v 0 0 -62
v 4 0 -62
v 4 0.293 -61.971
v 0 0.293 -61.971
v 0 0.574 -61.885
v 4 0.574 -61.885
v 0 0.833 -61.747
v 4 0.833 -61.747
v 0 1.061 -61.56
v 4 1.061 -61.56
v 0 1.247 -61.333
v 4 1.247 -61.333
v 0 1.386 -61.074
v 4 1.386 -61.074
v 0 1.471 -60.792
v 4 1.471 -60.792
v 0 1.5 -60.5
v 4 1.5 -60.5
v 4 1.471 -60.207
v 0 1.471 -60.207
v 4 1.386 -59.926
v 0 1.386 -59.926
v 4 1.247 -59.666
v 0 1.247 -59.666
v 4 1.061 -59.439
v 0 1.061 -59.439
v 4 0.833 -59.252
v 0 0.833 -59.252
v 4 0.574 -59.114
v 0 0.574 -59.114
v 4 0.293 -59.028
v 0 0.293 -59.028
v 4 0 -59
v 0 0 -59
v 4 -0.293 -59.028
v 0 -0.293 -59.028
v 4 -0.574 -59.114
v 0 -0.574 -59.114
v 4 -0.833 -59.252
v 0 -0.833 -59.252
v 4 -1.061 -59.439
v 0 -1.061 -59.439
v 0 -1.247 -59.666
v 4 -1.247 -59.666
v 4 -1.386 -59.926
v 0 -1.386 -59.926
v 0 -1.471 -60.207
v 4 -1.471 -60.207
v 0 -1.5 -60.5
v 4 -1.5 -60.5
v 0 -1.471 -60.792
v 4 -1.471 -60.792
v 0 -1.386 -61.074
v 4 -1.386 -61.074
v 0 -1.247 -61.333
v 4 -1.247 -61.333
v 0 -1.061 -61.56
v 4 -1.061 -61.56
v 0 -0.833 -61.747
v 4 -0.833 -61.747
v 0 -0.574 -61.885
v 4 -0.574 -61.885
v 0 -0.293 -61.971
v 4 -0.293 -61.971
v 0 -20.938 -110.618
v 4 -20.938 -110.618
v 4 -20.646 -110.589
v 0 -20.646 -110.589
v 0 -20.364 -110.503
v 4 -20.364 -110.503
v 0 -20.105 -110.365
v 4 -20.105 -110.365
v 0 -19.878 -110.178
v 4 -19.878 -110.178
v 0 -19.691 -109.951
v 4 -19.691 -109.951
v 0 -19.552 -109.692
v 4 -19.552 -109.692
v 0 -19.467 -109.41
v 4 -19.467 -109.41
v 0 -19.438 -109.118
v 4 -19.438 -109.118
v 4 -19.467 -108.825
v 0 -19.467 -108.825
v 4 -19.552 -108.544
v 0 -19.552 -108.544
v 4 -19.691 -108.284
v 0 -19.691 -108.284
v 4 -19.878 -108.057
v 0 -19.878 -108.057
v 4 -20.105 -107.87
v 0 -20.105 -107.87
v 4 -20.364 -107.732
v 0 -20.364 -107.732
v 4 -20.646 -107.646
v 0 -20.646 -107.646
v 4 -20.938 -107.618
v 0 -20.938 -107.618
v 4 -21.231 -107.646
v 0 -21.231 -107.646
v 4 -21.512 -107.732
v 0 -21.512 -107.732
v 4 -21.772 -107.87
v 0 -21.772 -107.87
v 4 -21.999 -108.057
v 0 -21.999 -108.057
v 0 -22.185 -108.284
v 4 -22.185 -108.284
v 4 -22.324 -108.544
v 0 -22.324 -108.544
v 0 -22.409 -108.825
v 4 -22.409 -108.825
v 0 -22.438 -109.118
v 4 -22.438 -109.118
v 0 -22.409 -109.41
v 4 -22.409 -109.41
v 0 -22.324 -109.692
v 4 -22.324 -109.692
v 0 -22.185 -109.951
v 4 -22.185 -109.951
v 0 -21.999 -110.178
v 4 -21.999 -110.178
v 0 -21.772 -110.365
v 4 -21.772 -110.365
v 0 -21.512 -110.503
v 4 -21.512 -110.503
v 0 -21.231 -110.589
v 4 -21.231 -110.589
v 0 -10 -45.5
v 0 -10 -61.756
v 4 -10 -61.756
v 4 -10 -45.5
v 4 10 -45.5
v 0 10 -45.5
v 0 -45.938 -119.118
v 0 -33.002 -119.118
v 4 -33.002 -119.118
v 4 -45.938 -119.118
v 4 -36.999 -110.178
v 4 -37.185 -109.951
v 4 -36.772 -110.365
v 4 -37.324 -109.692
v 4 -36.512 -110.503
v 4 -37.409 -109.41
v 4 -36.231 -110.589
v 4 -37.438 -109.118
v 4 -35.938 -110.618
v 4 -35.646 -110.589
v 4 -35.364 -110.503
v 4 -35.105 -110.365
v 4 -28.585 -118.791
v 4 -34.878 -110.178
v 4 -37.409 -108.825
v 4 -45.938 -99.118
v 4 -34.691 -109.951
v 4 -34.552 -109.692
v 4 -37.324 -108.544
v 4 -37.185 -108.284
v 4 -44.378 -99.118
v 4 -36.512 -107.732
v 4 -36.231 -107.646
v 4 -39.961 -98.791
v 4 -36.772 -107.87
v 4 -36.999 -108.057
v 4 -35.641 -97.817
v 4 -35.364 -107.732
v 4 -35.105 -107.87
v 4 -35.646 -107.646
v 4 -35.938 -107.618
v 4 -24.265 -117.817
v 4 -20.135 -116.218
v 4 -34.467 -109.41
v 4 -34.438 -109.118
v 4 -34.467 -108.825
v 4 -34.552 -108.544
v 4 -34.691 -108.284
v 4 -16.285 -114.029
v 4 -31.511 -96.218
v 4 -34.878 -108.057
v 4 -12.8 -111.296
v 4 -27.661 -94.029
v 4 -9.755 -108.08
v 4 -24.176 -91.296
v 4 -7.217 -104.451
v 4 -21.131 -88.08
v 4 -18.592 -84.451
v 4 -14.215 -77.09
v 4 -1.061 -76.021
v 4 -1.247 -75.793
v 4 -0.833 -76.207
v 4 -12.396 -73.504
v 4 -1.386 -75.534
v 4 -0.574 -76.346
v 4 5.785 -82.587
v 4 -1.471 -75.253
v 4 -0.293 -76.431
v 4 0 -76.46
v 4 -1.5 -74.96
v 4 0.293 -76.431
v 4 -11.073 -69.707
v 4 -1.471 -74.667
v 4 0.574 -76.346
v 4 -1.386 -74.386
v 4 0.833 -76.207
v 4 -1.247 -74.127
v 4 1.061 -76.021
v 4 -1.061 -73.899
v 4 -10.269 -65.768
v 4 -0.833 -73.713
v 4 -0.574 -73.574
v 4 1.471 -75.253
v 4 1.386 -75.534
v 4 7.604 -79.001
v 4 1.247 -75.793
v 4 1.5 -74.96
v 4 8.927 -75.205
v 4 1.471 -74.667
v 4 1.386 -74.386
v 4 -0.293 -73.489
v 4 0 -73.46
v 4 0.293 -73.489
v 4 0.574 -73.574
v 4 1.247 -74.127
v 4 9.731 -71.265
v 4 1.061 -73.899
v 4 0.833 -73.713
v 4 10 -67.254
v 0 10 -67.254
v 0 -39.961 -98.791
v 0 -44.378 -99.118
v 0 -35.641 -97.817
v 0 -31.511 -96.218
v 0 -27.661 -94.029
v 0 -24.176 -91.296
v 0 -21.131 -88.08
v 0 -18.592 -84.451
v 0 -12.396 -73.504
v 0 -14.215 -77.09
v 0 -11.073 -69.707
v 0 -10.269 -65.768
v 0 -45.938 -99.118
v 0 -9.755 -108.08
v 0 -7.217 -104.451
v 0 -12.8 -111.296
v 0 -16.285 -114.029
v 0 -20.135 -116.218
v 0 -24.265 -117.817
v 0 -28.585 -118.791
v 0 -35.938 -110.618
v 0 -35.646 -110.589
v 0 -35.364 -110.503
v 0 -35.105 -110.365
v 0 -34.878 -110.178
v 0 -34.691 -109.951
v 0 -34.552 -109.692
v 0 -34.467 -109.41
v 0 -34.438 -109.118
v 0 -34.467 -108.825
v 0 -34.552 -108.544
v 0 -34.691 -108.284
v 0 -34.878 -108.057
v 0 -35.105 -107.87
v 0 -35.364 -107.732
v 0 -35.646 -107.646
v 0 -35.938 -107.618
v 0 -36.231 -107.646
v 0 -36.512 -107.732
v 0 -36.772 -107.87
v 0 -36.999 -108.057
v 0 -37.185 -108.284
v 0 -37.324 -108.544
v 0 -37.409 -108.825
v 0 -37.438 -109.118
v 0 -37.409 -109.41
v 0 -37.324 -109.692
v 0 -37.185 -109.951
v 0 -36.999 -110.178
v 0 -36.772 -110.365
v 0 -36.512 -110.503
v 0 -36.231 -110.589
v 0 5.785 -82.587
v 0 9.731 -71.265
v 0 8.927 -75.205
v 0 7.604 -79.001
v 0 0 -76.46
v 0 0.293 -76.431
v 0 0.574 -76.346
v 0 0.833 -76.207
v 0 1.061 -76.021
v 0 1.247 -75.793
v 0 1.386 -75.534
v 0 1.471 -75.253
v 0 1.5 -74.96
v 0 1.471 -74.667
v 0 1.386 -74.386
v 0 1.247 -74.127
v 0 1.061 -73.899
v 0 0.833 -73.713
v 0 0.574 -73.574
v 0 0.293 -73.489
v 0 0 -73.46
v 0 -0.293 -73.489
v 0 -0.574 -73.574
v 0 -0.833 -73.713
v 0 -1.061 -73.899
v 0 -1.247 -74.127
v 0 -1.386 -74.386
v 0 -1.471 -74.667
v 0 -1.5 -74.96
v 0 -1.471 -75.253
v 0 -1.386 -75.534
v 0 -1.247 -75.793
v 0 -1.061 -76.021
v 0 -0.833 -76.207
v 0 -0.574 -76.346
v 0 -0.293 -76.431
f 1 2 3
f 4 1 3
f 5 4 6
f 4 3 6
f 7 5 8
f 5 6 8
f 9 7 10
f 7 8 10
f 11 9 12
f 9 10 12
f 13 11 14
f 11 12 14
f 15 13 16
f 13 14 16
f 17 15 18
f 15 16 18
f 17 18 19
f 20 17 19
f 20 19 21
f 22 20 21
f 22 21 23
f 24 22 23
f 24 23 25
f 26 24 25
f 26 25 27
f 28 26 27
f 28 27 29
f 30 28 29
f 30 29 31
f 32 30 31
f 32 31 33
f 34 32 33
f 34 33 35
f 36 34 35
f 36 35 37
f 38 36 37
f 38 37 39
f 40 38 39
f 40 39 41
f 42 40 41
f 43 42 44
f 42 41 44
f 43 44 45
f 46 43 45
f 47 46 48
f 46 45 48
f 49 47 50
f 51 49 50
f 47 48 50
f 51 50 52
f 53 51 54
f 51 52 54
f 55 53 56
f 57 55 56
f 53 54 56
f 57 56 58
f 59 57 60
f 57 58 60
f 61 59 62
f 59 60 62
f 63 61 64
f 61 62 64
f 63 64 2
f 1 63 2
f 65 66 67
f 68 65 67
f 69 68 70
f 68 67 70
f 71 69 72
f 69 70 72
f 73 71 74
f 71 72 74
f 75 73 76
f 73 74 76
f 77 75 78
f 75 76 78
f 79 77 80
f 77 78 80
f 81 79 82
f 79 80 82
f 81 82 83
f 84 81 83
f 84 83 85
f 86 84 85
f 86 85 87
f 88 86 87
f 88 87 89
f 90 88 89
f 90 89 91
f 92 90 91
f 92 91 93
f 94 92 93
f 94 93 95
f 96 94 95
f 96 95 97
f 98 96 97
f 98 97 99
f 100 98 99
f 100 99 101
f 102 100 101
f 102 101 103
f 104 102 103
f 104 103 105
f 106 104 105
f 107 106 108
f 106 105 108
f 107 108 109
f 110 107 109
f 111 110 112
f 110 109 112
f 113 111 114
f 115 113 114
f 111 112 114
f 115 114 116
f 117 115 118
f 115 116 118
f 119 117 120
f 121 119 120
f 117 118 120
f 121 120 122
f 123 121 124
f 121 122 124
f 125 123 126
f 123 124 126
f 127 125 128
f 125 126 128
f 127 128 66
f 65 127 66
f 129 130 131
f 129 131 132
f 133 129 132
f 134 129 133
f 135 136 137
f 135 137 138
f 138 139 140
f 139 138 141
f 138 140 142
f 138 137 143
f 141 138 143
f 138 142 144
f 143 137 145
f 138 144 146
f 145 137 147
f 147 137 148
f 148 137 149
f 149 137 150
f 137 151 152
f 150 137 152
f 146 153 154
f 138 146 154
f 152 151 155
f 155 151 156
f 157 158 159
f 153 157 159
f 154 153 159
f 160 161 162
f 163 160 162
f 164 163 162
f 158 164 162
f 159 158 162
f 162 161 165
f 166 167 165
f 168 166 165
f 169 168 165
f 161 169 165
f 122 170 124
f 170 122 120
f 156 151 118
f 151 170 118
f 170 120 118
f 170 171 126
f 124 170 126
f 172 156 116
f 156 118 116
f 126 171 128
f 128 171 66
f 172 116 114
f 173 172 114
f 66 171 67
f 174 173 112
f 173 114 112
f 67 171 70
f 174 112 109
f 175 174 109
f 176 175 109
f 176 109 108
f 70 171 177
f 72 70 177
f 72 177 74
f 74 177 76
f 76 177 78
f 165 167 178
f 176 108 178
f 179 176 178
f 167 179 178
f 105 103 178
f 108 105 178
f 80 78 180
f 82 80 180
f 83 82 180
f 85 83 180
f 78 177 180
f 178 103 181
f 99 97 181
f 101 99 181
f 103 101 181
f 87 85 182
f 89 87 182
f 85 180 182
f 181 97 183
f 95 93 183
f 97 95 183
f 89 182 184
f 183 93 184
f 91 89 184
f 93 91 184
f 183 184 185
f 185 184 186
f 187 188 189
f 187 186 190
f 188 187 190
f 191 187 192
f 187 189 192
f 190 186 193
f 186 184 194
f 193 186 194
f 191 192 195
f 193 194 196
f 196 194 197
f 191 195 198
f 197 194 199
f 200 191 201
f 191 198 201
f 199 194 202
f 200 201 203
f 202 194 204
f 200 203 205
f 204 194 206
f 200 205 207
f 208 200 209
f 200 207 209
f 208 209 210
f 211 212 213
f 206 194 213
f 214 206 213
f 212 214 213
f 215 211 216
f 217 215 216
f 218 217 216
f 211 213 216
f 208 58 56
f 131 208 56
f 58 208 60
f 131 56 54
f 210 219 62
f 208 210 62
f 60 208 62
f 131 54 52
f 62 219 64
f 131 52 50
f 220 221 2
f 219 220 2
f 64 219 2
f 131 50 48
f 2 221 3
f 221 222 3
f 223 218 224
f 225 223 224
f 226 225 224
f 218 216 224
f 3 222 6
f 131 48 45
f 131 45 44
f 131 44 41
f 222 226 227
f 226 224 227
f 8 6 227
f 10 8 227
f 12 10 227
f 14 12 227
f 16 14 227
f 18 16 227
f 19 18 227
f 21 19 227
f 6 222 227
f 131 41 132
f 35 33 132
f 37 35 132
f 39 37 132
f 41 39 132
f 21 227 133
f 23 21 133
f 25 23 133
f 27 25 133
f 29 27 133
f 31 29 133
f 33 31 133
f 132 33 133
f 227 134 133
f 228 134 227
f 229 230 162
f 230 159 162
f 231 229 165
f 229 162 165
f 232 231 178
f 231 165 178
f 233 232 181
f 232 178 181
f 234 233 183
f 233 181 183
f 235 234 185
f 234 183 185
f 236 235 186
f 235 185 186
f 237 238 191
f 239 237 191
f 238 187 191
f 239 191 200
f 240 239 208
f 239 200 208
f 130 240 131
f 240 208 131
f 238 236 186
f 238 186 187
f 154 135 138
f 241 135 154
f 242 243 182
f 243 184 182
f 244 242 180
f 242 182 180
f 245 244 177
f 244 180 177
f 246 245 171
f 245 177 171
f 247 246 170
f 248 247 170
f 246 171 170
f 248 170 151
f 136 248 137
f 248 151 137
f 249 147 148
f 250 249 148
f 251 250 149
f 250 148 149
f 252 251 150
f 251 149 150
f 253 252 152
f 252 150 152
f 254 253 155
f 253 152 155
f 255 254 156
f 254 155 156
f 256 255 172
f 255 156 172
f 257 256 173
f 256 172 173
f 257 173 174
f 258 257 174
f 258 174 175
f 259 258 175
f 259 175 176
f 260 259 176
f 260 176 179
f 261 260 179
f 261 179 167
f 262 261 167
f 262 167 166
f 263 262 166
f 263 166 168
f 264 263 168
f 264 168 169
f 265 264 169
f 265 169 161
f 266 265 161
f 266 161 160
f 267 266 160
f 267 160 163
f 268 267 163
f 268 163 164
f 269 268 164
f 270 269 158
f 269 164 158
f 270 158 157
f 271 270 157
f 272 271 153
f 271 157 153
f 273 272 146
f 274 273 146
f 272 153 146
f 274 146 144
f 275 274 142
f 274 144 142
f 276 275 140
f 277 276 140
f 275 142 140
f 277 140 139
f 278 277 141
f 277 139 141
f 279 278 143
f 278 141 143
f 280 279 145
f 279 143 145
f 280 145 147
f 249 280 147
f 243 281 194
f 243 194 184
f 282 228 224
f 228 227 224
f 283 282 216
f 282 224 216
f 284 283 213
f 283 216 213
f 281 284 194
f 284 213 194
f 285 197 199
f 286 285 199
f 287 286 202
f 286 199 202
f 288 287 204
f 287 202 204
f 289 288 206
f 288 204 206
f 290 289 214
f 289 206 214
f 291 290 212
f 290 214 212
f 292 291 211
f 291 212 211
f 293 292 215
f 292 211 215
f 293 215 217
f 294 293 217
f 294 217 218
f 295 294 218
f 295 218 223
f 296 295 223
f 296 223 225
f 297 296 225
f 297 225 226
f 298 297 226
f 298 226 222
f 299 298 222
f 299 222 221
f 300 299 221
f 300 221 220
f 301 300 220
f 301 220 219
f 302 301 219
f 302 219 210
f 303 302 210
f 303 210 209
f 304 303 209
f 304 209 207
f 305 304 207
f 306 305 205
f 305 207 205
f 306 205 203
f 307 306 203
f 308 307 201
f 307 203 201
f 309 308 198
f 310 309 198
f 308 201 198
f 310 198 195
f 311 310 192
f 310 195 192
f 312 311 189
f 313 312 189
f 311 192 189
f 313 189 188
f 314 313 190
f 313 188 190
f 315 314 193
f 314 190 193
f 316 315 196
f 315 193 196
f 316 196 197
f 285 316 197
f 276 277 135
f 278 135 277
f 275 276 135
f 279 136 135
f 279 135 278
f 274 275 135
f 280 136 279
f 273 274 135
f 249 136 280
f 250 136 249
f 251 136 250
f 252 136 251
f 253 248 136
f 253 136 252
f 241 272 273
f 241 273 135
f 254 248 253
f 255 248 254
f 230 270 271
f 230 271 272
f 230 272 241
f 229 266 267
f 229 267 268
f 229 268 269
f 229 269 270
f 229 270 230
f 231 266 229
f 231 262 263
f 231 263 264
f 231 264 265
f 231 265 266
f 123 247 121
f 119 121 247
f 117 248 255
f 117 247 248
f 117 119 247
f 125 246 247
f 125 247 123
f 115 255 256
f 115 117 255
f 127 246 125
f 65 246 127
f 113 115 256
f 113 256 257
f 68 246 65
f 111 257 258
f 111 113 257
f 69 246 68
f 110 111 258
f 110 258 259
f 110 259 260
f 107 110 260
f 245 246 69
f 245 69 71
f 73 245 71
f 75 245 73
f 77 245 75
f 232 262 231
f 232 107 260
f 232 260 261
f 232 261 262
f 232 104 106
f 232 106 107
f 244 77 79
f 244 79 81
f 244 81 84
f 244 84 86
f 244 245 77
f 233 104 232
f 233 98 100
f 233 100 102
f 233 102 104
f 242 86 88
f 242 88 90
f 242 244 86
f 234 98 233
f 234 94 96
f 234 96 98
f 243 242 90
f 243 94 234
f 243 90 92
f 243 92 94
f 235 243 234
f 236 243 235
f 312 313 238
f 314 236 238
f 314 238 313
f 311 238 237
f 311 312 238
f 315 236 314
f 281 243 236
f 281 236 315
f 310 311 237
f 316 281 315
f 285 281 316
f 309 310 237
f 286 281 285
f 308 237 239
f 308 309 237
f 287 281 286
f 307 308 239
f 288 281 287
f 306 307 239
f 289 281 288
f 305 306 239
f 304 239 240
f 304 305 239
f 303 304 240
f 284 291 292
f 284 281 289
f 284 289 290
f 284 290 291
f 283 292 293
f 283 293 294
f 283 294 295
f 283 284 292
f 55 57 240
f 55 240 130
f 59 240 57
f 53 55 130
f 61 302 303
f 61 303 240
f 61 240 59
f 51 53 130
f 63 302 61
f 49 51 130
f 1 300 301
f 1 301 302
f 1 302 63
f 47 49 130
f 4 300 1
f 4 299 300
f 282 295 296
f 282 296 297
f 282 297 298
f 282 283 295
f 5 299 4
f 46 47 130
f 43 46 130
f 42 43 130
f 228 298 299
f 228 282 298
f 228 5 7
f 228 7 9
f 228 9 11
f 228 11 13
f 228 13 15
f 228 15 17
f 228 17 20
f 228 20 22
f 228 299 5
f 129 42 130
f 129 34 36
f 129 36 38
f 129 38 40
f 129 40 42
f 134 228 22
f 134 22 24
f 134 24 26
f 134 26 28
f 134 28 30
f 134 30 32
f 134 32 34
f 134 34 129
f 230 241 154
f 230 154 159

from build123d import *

# Parameters (mm, degrees)
SALIENTE_EXTRUIR1_DEPTH = 4
REDONDEO1_R             = 30
CROQUIS2_R              = 1.5
CORTAR_EXTRUIR1_DEPTH   = 50
CROQUIS3_R              = 1.5
CORTAR_EXTRUIR2_DEPTH   = 10


with BuildPart() as part:
    # Croquis1 → Saliente-Extruir1 (new body)
    with BuildSketch(Plane(origin=(0, 0, 0), x_dir=(0, 0, -1), z_dir=(1, 0, 0))):
        Polygon((45.499640595, 10), (75.499640595, 10), (119.117632426, -15.938244799), (119.117632426, -45.938244799), (99.117632426, -45.938244799), (99.117632426, -27.314001558), (70.002247619, -10), (45.499640595, -10), align=None)
    extrude(amount=SALIENTE_EXTRUIR1_DEPTH)

    # Redondeo1
    redondeo1_edges = [part.edges().sort_by_distance(p)[0] for p in [
        (2, -27.314001558, -99.117632426),
        (2, -10, -70.002247619),
        (2, 10, -75.499640595),
        (2, -15.938244799, -119.117632426),
    ]]
    fillet(redondeo1_edges, radius=REDONDEO1_R)

    # Croquis2 → Cortar-Extruir1 (cut)
    with BuildSketch(Plane(origin=(4, 0, 0), x_dir=(0, 0, -1), z_dir=(1, 0, 0))):
        with Locations((60.499640595, 0)):
            Circle(CROQUIS2_R)
        with Locations((74.959961296, 0)):
            Circle(CROQUIS2_R)
    extrude(amount=-CORTAR_EXTRUIR1_DEPTH, mode=Mode.SUBTRACT)

    # Croquis3 → Cortar-Extruir2 (cut)
    with BuildSketch(Plane(origin=(4, 0, 0), x_dir=(0, 0, -1), z_dir=(1, 0, 0))):
        with Locations((109.117632426, -35.938244799)):
            Circle(CROQUIS3_R)
        with Locations((109.117632426, -20.938244799)):
            Circle(CROQUIS3_R)
    extrude(amount=-CORTAR_EXTRUIR2_DEPTH, mode=Mode.SUBTRACT)


solid = part.part
